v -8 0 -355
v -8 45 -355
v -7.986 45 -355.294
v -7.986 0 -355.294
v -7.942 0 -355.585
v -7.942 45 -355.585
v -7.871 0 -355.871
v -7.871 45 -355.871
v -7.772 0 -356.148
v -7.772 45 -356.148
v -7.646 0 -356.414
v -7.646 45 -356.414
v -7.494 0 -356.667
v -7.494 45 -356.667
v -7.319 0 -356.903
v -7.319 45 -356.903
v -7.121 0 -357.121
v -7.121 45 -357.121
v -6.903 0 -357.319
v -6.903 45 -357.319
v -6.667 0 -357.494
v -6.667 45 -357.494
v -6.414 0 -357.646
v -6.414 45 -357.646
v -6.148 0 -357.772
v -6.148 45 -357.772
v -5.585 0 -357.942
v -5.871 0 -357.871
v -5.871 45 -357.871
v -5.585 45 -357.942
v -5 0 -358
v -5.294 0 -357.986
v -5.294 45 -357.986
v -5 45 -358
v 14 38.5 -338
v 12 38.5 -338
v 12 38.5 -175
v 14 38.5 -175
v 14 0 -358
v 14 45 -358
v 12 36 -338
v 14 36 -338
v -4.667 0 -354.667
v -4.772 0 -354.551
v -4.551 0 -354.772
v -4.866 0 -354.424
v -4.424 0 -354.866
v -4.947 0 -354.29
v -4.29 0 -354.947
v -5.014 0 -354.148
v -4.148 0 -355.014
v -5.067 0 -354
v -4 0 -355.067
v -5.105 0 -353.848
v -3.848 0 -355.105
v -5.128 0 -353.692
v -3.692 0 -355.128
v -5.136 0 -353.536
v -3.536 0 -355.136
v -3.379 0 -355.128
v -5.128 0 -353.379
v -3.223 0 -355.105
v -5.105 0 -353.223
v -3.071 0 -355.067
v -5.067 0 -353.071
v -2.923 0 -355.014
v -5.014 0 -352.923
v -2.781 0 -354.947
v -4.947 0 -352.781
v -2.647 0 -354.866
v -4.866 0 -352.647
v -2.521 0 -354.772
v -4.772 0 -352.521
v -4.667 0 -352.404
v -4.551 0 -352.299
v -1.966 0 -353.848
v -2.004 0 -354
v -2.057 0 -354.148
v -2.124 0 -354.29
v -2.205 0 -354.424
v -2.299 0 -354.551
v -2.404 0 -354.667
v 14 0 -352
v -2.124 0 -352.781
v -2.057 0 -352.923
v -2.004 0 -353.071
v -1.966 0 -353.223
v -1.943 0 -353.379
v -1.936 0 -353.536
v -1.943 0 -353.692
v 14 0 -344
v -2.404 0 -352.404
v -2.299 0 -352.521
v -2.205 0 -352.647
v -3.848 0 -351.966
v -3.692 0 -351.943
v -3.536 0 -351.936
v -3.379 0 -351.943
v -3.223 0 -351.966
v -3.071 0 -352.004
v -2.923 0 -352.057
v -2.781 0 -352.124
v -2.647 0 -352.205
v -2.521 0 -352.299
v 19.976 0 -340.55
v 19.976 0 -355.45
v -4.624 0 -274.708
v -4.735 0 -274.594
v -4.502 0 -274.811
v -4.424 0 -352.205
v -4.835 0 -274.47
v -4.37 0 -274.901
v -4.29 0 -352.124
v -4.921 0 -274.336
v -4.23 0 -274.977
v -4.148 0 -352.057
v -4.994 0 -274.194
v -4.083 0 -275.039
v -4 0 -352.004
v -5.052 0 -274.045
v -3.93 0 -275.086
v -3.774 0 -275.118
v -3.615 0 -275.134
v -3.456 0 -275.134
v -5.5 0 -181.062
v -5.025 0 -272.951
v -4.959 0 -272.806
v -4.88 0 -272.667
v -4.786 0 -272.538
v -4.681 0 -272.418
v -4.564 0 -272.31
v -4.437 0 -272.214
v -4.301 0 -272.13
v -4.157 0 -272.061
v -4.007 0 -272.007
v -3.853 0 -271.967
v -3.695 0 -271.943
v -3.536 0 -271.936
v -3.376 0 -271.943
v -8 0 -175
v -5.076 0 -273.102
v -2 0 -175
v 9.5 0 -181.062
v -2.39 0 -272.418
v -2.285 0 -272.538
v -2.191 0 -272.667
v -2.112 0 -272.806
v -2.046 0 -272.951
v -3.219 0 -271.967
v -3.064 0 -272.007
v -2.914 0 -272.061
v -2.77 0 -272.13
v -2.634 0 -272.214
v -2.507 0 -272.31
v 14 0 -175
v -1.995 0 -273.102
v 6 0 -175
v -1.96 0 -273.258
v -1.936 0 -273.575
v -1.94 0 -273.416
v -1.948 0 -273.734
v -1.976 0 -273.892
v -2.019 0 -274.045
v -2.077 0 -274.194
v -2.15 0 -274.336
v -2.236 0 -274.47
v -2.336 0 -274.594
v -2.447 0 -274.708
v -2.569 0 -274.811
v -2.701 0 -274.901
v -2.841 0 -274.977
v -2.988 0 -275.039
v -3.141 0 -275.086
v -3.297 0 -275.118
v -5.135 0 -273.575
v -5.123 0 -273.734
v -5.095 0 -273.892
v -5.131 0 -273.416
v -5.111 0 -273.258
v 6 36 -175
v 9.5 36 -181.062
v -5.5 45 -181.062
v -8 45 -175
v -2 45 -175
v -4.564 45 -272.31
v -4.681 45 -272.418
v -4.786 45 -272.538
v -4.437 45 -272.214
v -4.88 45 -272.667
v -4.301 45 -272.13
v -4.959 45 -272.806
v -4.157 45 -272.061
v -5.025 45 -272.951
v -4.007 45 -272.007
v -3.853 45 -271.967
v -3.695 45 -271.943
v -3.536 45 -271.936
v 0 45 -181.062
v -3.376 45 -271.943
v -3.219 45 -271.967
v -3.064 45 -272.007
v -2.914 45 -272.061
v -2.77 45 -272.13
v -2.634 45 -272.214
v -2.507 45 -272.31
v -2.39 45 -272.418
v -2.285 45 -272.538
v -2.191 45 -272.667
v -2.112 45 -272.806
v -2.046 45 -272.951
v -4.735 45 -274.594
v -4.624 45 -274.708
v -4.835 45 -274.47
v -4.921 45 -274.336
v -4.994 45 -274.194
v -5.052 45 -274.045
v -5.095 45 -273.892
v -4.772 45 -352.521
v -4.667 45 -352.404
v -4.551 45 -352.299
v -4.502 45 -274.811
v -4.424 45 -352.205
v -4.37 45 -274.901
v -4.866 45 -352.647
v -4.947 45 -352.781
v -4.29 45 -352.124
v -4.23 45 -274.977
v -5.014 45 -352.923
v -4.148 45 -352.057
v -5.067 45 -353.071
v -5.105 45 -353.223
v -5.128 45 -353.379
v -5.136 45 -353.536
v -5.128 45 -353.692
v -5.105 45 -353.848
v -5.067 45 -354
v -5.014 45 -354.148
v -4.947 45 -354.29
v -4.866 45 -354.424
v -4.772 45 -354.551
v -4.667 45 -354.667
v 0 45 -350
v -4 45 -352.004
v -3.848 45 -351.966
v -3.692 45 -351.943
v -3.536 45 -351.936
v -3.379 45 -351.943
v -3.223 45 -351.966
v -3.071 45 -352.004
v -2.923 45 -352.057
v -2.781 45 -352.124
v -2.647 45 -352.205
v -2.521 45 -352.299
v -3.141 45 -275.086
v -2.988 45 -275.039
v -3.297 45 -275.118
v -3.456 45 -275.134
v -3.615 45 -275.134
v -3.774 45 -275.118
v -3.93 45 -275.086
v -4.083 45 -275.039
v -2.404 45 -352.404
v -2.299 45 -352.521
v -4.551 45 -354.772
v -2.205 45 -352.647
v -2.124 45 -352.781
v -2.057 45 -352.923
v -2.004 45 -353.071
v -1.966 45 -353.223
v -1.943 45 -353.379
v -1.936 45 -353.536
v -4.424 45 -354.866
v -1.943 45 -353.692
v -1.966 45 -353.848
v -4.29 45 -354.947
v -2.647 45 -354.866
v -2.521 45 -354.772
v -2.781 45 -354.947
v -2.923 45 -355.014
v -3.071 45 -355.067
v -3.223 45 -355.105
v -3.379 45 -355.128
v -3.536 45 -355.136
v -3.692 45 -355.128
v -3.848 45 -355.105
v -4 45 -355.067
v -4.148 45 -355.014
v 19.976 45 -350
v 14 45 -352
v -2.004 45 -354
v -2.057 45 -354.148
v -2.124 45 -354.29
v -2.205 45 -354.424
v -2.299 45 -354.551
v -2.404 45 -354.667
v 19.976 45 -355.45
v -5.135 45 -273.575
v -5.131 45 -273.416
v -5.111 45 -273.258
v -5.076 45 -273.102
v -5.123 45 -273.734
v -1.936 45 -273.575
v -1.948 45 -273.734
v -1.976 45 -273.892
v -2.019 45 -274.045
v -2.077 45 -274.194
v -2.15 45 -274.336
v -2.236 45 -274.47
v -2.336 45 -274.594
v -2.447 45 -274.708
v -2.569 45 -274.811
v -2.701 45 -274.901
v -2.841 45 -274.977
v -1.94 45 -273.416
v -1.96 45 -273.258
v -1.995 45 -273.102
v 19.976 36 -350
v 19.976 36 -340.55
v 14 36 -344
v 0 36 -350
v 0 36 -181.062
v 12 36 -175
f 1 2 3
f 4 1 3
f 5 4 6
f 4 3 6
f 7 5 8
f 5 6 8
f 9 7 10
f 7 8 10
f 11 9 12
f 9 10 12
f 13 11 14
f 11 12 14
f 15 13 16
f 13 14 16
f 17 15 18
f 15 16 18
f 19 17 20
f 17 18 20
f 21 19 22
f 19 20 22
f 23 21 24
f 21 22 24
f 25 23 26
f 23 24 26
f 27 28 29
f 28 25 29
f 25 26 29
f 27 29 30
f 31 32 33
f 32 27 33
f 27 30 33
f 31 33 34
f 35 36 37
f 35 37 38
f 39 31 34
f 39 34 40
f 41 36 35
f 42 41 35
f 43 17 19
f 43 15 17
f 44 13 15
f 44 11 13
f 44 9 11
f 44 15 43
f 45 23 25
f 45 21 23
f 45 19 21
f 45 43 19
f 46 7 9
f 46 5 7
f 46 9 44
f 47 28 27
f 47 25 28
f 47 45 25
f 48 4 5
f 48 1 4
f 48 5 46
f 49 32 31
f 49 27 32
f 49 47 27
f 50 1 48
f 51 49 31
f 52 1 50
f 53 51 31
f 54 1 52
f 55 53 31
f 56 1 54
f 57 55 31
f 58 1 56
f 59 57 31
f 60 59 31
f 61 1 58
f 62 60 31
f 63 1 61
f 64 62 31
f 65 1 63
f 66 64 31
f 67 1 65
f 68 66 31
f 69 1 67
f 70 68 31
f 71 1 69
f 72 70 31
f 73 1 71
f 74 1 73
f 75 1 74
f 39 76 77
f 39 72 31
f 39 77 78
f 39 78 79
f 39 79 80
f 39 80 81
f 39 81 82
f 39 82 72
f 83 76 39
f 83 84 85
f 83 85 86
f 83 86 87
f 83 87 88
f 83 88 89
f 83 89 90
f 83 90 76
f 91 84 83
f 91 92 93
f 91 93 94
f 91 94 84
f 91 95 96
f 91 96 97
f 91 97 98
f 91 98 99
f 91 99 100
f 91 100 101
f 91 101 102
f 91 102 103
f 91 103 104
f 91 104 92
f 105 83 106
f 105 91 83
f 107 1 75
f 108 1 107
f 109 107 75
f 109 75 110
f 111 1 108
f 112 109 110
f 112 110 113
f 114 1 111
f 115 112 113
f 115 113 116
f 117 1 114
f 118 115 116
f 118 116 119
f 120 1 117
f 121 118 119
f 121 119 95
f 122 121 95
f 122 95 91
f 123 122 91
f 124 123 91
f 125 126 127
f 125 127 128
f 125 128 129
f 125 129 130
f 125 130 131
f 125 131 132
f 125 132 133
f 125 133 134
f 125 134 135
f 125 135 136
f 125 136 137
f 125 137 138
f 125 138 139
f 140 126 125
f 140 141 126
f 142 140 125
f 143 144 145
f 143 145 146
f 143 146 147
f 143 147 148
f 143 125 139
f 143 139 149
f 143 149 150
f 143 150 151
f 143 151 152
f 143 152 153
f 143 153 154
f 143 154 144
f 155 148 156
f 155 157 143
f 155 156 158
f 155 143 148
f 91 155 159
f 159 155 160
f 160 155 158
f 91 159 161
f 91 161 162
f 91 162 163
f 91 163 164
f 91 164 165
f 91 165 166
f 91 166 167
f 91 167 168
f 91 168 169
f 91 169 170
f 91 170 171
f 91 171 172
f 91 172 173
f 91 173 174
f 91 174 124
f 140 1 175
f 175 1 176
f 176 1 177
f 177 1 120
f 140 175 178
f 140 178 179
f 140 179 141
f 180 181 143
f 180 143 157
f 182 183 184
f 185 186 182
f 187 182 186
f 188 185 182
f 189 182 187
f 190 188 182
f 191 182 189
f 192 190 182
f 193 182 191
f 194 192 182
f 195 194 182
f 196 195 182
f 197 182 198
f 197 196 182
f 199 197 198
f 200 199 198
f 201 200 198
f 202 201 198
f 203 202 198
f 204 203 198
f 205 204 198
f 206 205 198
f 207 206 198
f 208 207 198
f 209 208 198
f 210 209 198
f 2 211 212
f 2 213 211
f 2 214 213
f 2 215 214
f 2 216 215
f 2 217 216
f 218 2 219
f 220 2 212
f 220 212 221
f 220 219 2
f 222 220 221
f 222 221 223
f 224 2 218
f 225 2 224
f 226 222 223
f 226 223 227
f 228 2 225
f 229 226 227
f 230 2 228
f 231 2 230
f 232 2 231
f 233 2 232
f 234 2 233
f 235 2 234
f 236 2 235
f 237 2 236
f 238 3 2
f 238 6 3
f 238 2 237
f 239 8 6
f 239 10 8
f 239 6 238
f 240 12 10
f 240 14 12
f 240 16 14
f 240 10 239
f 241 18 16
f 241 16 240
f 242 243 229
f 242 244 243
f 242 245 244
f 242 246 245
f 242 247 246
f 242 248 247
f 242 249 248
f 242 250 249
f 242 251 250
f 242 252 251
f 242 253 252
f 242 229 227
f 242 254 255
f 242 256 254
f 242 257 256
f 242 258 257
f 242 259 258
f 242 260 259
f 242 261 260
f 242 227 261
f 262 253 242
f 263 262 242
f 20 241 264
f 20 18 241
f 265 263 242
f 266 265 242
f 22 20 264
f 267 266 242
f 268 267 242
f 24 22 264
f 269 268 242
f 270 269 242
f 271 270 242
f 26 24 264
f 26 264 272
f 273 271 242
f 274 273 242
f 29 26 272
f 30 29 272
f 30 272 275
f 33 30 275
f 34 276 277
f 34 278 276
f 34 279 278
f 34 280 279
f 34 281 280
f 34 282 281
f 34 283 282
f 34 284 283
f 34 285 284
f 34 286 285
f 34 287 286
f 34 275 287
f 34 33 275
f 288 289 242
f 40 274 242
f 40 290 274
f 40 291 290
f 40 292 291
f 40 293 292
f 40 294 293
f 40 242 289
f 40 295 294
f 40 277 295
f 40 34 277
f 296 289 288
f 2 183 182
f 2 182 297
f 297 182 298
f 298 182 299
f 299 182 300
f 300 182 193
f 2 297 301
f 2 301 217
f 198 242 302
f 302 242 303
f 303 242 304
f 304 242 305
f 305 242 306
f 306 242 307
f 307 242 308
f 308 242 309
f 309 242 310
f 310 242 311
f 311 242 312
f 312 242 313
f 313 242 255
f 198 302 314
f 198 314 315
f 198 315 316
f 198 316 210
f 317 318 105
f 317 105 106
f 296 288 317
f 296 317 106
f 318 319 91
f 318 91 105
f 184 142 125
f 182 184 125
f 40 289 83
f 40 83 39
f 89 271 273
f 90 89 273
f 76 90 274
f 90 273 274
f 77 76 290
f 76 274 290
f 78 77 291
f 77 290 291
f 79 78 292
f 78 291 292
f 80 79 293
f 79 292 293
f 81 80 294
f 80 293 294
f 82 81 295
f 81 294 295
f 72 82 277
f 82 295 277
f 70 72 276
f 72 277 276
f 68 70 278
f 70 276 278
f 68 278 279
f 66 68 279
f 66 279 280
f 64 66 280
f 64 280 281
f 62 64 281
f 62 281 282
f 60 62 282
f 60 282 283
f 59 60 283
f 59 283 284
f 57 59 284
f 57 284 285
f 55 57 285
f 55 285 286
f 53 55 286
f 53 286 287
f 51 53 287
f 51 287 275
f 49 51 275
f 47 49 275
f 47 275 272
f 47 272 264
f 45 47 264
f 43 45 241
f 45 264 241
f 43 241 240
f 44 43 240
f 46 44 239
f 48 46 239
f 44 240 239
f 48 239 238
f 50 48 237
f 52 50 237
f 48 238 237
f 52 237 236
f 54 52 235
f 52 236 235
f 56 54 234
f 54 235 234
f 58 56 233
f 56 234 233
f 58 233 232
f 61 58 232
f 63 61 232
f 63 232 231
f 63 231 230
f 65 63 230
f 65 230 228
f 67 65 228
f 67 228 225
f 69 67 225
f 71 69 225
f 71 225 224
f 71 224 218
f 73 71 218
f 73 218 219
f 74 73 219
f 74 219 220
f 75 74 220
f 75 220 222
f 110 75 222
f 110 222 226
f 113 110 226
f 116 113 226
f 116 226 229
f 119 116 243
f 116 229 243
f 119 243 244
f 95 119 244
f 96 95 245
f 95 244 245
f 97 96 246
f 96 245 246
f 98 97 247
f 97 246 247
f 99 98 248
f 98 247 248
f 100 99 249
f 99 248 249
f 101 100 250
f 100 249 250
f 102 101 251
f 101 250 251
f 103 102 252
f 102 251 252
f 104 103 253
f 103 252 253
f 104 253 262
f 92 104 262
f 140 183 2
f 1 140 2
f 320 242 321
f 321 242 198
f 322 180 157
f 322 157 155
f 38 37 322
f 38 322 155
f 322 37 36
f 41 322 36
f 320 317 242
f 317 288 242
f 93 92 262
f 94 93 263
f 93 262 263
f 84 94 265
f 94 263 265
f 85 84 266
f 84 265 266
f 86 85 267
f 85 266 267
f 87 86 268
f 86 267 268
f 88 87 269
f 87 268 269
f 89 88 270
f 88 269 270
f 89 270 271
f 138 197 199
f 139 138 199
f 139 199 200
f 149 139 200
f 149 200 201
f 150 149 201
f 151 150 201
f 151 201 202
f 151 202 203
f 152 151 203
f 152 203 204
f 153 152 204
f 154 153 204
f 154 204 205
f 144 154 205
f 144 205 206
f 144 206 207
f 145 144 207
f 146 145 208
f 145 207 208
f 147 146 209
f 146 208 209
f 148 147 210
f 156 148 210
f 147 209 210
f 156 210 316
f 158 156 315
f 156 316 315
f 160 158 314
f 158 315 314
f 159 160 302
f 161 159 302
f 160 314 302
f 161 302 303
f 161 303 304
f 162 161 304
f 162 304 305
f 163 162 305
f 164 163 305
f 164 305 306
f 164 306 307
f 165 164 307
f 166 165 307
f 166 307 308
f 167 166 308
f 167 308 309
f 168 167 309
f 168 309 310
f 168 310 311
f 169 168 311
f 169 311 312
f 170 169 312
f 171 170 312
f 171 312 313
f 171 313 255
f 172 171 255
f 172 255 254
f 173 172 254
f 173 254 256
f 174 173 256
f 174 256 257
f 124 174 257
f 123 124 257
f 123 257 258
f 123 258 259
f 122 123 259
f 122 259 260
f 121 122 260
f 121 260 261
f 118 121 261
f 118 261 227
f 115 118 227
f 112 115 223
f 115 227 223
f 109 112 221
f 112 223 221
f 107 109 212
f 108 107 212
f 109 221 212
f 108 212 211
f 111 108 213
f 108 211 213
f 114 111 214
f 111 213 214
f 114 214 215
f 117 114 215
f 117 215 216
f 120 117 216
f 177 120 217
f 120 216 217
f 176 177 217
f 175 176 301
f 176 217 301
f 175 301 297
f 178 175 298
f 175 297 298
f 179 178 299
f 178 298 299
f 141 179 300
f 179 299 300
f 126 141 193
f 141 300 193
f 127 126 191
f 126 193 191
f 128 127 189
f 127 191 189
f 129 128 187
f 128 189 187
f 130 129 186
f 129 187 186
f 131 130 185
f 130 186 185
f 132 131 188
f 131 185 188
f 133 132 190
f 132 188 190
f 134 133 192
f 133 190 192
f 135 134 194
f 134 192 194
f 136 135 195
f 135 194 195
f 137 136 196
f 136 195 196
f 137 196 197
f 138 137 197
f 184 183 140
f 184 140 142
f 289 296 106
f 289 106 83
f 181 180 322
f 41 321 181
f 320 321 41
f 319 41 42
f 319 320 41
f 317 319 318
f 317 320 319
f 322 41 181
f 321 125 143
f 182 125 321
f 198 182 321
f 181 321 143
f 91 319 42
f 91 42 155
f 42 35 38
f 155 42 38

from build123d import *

# Parameters (mm, degrees)
SKETCH_1_W           = 270
SKETCH_1_H           = 370
SKETCH_1_W_2         = 250
SKETCH_1_H_2         = 350
EXTRUDE_2_DEPTH      = 45
SKETCH_4_W           = 250
SKETCH_4_H           = 350
SKETCH_4_W_2         = 222
SKETCH_4_H_2         = 322
EXTRUDE_3_DEPTH      = 5
SKETCH_9_W           = 246
SKETCH_9_H           = 346
SKETCH_9_W_2         = 226
SKETCH_9_H_2         = 326
CUT_EXTRUDE_3_DEPTH  = 2.5
SKETCH_12_R          = 1.6
CUT_EXTRUDE_5_DEPTH  = 109.5
FILLET_1_R           = 5
SKETCH_13_W          = 250
SKETCH_13_H          = 350
SKETCH_13_W_2        = 222
SKETCH_13_H_2        = 322
EXTRUDE_4_DEPTH      = 33.5
CUT_EXTRUDE_START    = -126.5
SKETCH_14_R          = 1.6
CUT_EXTRUDE_10_DEPTH = 126.5
CUT_EXTRUDE_11_DEPTH = 46
CUT_EXTRUDE_13_DEPTH = 2.5
SKETCH_17_R          = 1.6
CUT_EXTRUDE_14_DEPTH = 75.5


with BuildPart() as part:
    # 草图1 → 凸台-拉伸2 (new body)
    with BuildSketch(Plane(origin=(0, 0, 0), x_dir=(1, 0, 0), z_dir=(0, 1, 0))):
        with Locations((125, 175)):
            Rectangle(SKETCH_1_W, SKETCH_1_H)
        with Locations((125, 175)):
            Rectangle(SKETCH_1_W_2, SKETCH_1_H_2, mode=Mode.SUBTRACT)
    extrude(amount=EXTRUDE_2_DEPTH)

    # 草图4 → 凸台-拉伸3 (add)
    with BuildSketch(Plane(origin=(0, 38.5, 0), x_dir=(1, 0, 0), z_dir=(0, 1, 0))):
        with Locations((125, 175)):
            Rectangle(SKETCH_4_W, SKETCH_4_H)
        with Locations((125, 175)):
            Rectangle(SKETCH_4_W_2, SKETCH_4_H_2, mode=Mode.SUBTRACT)
    extrude(amount=-EXTRUDE_3_DEPTH)

    # 草图9 → 切除-拉伸3 (cut)
    with BuildSketch(Plane(origin=(0, 38.5, 0), x_dir=(1, 0, 0), z_dir=(0, 1, 0))):
        with Locations((125, 175)):
            Rectangle(SKETCH_9_W, SKETCH_9_H)
        with Locations((125, 175)):
            Rectangle(SKETCH_9_W_2, SKETCH_9_H_2, mode=Mode.SUBTRACT)
    extrude(amount=-CUT_EXTRUDE_3_DEPTH, mode=Mode.SUBTRACT)

    # 草图12 → 切除-拉伸5 (cut)
    with BuildSketch(Plane(origin=(0, 45, 0), x_dir=(1, 0, 0), z_dir=(0, 1, 0))):
        with Locations(Location((-3.535533906, -3.535533906, 0), (0, 0, 270))):
            Circle(SKETCH_12_R)
        with BuildLine():
            ThreePointArc((-4.666904756, 354.666904756), (-4.666904756, 352.404163056), (-2.404163056, 352.404163056))
            Line((-2.404163056, 352.404163056), (-4.666904756, 354.666904756))
        make_face()
        with BuildLine():
            Line((-4.666904756, 354.666904756), (-2.404163056, 352.404163056))
            ThreePointArc((-2.404163056, 352.404163056), (-2.057326654, 352.923240414), (-1.935533906, 353.535533906))
            ThreePointArc((-1.935533906, 353.535533906), (-2.923240414, 355.013741158), (-4.666904756, 354.666904756))
        make_face()
        with Locations(Location((253.535533906, 353.535533906, 0), (0, 0, 270))):
            Circle(SKETCH_12_R)
        with Locations(Location((253.535533906, -3.535533906, 0), (0, 0, 270))):
            Circle(SKETCH_12_R)
    extrude(amount=-CUT_EXTRUDE_5_DEPTH, mode=Mode.SUBTRACT)

    # 圆角1
    fillet_1_edges = [part.edges().sort_by_distance(p)[0] for p in [
        (-10, 22.5, 10),
        (-10, 22.5, -360),
        (260, 22.5, -360),
        (260, 22.5, 10),
    ]]
    fillet(fillet_1_edges, radius=FILLET_1_R)

    # 草图13 → 凸台-拉伸4 (add)
    with BuildSketch(Plane.XZ.offset(-33.5)):
        with Locations((125, -175)):
            Rectangle(SKETCH_13_W, SKETCH_13_H)
        with Locations((125, -175)):
            Rectangle(SKETCH_13_W_2, SKETCH_13_H_2, mode=Mode.SUBTRACT)
    extrude(amount=EXTRUDE_4_DEPTH)

    # 草图14 → 切除-拉伸10 (cut)
    # profile 1 of 10: a face of its own
    with BuildSketch(Plane.XZ.offset(CUT_EXTRUDE_START)):
        with BuildLine():
            Line((14, -175), (14, -14))
            Line((14, -14), (14, -6))
            Line((14, -6), (14, 2))
            Line((14, 2), (14, 10))
            Line((14, 10), (-5, 10))
            ThreePointArc((-5, 10), (-8.535533906, 8.535533906), (-10, 5))
            Line((-10, 5), (-10, -175))
            Line((-10, -175), (-2, -175))
            Line((-2, -175), (6, -175))
            Line((6, -175), (14, -175))
        make_face()
        with Locations((-3.535533906, 3.535533906)):
            Circle(SKETCH_14_R, mode=Mode.SUBTRACT)
    # profile 2 of 10: a face of its own
    with BuildSketch(Plane.XZ.offset(CUT_EXTRUDE_START)):
        Polygon((9.5, -181.062177826), (6, -175), (-2, -175), (-5.5, -181.062177826), align=None)
    # profile 3 of 10: a face of its own
    with BuildSketch(Plane.XZ.offset(CUT_EXTRUDE_START)):
        with Locations((-3.535533906, 3.535533906)):
            Circle(SKETCH_14_R)
    # profile 4 of 10: a face of its own
    with BuildSketch(Plane.XZ.offset(CUT_EXTRUDE_START)):
        Polygon((14, -6), (14, -14), (125, -14), (125, 10), (14, 10), (14, 2), (19.975575286, 5.45), (19.975575286, -9.45), align=None)
    # profile 5 of 10: a face of its own
    with BuildSketch(Plane.XZ.offset(CUT_EXTRUDE_START)):
        Polygon((14, 2), (14, -6), (19.975575286, -9.45), (19.975575286, 5.45), align=None)
    # profile 6 of 10: a face of its own
    with BuildSketch(Plane.XZ.offset(CUT_EXTRUDE_START)):
        Polygon((125, 10), (125, -14), (236, -14), (236, -6), (230.024424714, -9.45), (230.024424714, 5.45), (236, 2), (236, 10), align=None)
    # profile 7 of 10: a face of its own
    with BuildSketch(Plane.XZ.offset(CUT_EXTRUDE_START)):
        Polygon((230.024424714, -9.45), (236, -6), (236, 2), (230.024424714, 5.45), align=None)
    # profile 8 of 10: a face of its own
    with BuildSketch(Plane.XZ.offset(CUT_EXTRUDE_START)):
        with BuildLine():
            Line((236, -336), (14, -336))
            Line((14, -336), (14, -344))
            Line((14, -344), (19.975575286, -340.55))
            Line((19.975575286, -340.55), (19.975575286, -355.45))
            Line((19.975575286, -355.45), (14, -352))
            Line((14, -352), (14, -360))
            Line((14, -360), (255, -360))
            ThreePointArc((255, -360), (258.535533906, -358.535533906), (260, -355))
            Line((260, -355), (260, 5))
            ThreePointArc((260, 5), (258.535533906, 8.535533906), (255, 10))
            Line((255, 10), (236, 10))
            Line((236, 10), (236, 2))
            Line((236, 2), (236, -6))
            Line((236, -6), (236, -14))
            Line((236, -14), (236, -336))
        make_face()
        with Locations((253.535533906, -353.535533906)):
            Circle(SKETCH_14_R, mode=Mode.SUBTRACT)
        with Locations((253.535533906, 3.535533906)):
            Circle(SKETCH_14_R, mode=Mode.SUBTRACT)
    # profile 9 of 10: a face of its own
    with BuildSketch(Plane.XZ.offset(CUT_EXTRUDE_START)):
        with Locations((253.535533906, 3.535533906)):
            Circle(SKETCH_14_R)
    # profile 10 of 10: a face of its own
    with BuildSketch(Plane.XZ.offset(CUT_EXTRUDE_START)):
        with Locations((253.535533906, -353.535533906)):
            Circle(SKETCH_14_R)
    extrude(amount=CUT_EXTRUDE_10_DEPTH, mode=Mode.SUBTRACT)

    # 草图15 → 切除-拉伸11 (cut)
    with BuildSketch(Plane(origin=(0, 45, 0), x_dir=(1, 0, 0), z_dir=(0, 1, 0))):
        with BuildLine():
            Line((-5, 358), (12, 358))
            Line((12, 358), (14, 358))
            Line((14, 358), (14, 360))
            Line((14, 360), (-5, 360))
            ThreePointArc((-5, 360), (-8.535533906, 358.535533906), (-10, 355))
            Line((-10, 355), (-10, 175))
            Line((-10, 175), (-8, 175))
            Line((-8, 175), (-8, 177))
            Line((-8, 177), (-8, 355))
            ThreePointArc((-8, 355), (-7.121320344, 357.121320344), (-5, 358))
        make_face()
    extrude(amount=-CUT_EXTRUDE_11_DEPTH, mode=Mode.SUBTRACT)

    # 草图16 → 切除-拉伸13 (cut)
    with BuildSketch(Plane(origin=(0, 38.5, 0), x_dir=(1, 0, 0), z_dir=(0, 1, 0))):
        Polygon((19.975575286, 348), (19.975575286, 350), (0, 350), (0, 181.062177826), (2, 181.062177826), (2, 348), align=None)
    extrude(amount=-CUT_EXTRUDE_13_DEPTH, mode=Mode.SUBTRACT)

    # 草图17 → 切除-拉伸14 (cut)
    with BuildSketch(Plane(origin=(0, 45, 0), x_dir=(1, 0, 0), z_dir=(0, 1, 0))):
        with Locations(Location((-3.535533906, 273.535533906, 0), (0, 0, 270))):
            Circle(SKETCH_17_R)
    extrude(amount=-CUT_EXTRUDE_14_DEPTH, mode=Mode.SUBTRACT)


solid = part.part
